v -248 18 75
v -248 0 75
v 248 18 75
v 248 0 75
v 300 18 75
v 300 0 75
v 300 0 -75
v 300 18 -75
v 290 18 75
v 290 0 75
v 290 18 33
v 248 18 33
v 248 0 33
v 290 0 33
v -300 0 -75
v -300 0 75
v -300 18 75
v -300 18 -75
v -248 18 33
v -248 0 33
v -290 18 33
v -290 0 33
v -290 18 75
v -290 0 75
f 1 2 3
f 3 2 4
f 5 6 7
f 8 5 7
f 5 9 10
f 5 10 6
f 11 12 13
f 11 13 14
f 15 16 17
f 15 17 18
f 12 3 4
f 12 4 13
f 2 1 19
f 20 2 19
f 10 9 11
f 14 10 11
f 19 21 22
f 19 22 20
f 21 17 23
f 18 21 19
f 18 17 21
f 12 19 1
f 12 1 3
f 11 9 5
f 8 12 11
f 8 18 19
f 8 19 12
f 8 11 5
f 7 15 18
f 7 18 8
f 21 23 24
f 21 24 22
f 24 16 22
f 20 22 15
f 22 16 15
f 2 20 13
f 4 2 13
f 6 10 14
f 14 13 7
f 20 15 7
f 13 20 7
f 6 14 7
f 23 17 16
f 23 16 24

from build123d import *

# Parameters (mm, degrees)
ESQUISSE1_W             = 600
ESQUISSE1_H             = 150
BOSS_EXTRU_1_DEPTH      = 18
ESQUISSE3_W             = 42
ESQUISSE3_H             = 42
ENL_V_MAT_EXTRU_1_DEPTH = 20


with BuildPart() as part:
    # Esquisse1 → Boss.-Extru.1 (new body)
    with BuildSketch(Plane(origin=(0, 0, 0), x_dir=(1, 0, 0), z_dir=(0, 1, 0))):
        Rectangle(ESQUISSE1_W, ESQUISSE1_H)
    extrude(amount=BOSS_EXTRU_1_DEPTH)

    # Esquisse3 → Enlèv. mat.-Extru.1 (cut)
    with BuildSketch(Plane(origin=(0, 18, 0), x_dir=(1, 0, 0), z_dir=(0, 1, 0))):
        with Locations((-269, -54)):
            Rectangle(ESQUISSE3_W, ESQUISSE3_H)
        with Locations((269, -54)):
            Rectangle(ESQUISSE3_W, ESQUISSE3_H)
    extrude(amount=-ENL_V_MAT_EXTRU_1_DEPTH, mode=Mode.SUBTRACT)


solid = part.part
